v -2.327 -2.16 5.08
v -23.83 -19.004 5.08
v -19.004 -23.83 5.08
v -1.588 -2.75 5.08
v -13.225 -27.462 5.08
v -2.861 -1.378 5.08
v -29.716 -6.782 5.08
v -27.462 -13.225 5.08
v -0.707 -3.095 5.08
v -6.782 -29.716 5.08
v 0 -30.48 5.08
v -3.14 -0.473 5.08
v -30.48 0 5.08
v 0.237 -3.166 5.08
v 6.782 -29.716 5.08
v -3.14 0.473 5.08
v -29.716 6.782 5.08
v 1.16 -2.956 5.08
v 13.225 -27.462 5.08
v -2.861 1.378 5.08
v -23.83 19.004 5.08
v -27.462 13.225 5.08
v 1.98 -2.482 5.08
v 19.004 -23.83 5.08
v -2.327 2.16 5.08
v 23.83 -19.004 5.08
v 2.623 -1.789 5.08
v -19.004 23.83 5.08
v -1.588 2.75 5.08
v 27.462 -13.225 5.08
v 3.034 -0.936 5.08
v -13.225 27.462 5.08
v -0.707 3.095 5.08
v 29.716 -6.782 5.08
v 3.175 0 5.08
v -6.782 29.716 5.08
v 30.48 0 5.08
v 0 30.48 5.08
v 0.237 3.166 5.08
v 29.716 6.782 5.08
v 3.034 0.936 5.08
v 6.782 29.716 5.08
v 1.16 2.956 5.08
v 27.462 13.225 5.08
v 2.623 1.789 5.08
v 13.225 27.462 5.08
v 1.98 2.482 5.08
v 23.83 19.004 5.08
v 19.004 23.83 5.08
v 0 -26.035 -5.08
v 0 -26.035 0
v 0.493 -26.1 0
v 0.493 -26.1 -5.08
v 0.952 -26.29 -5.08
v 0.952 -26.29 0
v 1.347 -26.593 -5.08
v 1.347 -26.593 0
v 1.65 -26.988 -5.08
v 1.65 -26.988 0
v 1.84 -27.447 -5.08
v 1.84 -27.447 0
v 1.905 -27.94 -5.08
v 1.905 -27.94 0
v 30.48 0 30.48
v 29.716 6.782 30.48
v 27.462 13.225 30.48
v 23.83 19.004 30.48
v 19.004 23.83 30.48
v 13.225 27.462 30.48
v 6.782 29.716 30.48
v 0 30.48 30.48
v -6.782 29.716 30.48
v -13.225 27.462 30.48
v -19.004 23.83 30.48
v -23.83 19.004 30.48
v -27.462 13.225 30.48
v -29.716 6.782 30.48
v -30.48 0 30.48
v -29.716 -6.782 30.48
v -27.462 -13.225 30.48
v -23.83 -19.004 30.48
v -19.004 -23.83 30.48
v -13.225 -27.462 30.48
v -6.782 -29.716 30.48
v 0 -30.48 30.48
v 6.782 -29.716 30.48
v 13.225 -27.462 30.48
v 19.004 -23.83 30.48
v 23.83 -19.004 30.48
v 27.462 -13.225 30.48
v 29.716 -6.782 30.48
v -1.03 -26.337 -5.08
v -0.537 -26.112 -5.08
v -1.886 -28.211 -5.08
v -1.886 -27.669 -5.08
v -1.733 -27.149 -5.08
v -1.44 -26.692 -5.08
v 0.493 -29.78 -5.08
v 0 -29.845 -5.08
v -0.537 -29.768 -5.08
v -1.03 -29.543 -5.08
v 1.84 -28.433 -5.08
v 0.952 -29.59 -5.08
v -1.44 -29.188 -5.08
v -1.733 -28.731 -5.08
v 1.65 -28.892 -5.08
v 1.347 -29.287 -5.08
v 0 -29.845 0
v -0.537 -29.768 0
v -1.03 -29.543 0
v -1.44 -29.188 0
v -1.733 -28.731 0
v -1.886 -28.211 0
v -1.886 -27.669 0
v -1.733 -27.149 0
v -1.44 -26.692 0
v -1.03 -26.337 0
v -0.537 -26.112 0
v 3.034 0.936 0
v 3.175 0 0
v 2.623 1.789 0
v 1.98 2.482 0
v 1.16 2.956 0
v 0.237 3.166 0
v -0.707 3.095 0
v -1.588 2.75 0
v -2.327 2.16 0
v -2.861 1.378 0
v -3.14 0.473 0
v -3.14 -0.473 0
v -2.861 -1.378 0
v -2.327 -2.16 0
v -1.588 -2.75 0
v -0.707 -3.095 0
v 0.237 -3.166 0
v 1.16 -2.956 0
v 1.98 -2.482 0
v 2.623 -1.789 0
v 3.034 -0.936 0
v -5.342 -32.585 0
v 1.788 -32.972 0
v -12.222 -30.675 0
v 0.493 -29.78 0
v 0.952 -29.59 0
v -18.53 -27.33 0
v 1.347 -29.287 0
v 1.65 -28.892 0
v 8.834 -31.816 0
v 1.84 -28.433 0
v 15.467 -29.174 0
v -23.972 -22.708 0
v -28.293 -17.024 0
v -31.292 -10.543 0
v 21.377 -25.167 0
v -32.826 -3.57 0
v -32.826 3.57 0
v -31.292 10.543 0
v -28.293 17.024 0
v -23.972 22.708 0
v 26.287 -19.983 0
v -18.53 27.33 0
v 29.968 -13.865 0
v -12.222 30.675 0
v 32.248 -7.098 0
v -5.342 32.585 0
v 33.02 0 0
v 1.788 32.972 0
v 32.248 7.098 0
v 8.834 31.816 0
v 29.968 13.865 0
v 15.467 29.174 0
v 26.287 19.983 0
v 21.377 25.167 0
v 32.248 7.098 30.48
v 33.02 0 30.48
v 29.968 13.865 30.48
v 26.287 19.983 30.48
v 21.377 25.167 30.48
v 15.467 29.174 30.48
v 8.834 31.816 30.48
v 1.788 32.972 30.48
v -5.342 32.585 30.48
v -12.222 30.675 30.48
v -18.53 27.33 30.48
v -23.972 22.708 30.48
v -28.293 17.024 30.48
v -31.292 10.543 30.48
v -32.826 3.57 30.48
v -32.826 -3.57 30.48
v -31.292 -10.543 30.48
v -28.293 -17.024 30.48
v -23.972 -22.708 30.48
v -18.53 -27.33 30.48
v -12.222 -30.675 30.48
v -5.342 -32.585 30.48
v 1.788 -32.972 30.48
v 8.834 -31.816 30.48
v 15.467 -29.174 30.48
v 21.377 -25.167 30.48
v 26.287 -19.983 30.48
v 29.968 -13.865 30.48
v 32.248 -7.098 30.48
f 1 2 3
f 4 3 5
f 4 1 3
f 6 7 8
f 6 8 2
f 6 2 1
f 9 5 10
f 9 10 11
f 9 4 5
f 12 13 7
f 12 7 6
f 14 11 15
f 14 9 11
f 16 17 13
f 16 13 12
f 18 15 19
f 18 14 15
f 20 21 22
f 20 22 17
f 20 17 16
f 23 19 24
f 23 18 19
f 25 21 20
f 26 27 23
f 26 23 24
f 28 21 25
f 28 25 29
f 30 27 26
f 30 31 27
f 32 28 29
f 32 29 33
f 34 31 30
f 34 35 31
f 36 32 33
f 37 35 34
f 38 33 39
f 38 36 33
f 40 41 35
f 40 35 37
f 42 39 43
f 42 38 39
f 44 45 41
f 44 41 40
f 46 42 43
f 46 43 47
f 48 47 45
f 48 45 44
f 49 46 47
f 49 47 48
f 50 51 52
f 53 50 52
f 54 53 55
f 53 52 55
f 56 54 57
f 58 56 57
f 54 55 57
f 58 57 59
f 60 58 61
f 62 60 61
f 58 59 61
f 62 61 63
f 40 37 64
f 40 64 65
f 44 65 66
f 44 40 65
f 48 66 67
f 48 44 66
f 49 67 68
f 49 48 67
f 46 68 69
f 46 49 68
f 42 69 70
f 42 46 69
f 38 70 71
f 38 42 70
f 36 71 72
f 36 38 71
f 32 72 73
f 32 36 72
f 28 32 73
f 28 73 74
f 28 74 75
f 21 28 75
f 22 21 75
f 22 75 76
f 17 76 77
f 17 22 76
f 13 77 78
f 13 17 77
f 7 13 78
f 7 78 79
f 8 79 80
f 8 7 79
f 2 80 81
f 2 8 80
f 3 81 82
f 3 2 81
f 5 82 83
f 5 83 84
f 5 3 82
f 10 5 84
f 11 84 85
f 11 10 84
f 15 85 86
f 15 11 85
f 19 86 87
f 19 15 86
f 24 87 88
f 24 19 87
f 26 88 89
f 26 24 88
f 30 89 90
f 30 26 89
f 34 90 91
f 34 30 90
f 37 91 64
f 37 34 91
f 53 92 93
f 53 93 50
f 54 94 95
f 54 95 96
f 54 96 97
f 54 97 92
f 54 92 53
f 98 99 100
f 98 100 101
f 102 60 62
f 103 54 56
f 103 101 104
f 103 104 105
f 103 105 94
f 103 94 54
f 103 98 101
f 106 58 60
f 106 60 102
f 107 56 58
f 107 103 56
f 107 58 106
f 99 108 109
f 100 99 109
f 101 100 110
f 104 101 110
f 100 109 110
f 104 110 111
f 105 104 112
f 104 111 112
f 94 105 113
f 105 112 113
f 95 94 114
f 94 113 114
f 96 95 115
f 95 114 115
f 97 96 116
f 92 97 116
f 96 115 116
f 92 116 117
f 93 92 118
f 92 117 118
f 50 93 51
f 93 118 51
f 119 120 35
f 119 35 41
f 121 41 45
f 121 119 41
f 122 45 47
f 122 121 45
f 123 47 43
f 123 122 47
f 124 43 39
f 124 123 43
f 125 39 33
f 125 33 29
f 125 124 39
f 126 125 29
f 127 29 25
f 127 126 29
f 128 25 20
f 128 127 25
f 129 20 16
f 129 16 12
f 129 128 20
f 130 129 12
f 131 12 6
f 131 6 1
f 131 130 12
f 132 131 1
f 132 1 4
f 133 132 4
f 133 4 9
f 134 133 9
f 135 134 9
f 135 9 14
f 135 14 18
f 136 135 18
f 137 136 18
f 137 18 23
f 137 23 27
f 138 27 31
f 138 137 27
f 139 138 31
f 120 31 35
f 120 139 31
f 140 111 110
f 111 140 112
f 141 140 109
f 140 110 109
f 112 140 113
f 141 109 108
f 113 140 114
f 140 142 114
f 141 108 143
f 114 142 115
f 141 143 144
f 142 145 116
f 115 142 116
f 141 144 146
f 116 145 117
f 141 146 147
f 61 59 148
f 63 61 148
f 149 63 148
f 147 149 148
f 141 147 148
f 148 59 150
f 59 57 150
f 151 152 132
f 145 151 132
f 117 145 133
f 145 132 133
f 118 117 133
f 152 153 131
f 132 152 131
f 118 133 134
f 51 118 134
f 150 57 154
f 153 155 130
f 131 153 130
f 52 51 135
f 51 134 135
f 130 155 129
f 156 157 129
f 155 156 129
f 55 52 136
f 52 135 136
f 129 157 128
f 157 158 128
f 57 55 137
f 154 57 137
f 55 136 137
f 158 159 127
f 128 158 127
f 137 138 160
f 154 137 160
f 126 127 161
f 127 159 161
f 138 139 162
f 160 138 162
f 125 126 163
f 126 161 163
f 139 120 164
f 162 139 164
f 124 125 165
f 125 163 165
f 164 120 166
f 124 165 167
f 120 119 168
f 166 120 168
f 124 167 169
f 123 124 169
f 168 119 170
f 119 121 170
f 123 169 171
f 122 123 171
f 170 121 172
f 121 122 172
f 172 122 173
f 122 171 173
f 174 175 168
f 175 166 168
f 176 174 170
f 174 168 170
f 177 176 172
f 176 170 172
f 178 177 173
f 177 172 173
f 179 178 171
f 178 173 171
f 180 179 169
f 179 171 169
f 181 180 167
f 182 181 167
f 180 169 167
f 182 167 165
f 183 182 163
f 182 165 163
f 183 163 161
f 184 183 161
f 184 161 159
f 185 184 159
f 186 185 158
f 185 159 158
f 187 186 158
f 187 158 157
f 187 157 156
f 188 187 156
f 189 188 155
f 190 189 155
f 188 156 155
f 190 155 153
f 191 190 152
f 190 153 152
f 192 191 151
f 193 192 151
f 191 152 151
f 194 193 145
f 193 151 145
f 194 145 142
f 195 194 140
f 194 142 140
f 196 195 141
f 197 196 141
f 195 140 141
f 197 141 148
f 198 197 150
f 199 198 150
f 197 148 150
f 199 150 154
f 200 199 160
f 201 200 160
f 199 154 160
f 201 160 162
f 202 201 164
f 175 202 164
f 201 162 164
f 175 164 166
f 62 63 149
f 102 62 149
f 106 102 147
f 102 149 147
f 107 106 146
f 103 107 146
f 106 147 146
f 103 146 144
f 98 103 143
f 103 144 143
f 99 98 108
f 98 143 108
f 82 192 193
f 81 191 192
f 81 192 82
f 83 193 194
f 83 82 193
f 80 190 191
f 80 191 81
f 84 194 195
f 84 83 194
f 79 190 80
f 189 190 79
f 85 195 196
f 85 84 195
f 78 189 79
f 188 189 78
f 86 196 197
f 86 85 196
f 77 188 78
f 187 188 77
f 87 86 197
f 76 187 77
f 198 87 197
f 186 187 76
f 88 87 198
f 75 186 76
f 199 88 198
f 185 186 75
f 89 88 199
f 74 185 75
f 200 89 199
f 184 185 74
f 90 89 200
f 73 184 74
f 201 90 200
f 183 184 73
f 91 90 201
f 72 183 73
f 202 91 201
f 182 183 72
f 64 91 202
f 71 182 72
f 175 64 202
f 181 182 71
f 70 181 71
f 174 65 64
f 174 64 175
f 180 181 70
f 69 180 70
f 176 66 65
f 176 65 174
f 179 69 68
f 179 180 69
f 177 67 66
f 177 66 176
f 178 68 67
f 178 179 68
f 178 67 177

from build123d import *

# Parameters (mm, degrees)
F0_R     = 33.02
F0_R_2   = 3.175
F1_DEPTH = 5.08
F2_R     = 33.02
F2_R_2   = 30.48
F3_DEPTH = 25.4
F5_DEPTH = 5.08


with BuildPart() as f1:
    # F0 (on Top) → F1 (new body)
    with BuildSketch(Plane.XY):
        Circle(F0_R)
        Circle(F0_R_2, mode=Mode.SUBTRACT)
    extrude(amount=F1_DEPTH)

    # F2 (on face) → F3 (join)
    with BuildSketch(Plane.XY.offset(5.08)):
        Circle(F2_R)
        Circle(F2_R_2, mode=Mode.SUBTRACT)
    extrude(amount=F3_DEPTH)

    # F4 (on face) → F5 (join)
    with BuildSketch(Plane(origin=(0, 0, 0), x_dir=(1, 0, 0), z_dir=(0, 0, -1))):
        with BuildLine():
            Line((0, 29.845), (0, 26.035))
            ThreePointArc((0, 26.035), (1.347038, 26.592962), (1.905, 27.94))
            ThreePointArc((1.905, 27.94), (1.347038, 29.287038), (0, 29.845))
        make_face()
        with BuildLine():
            ThreePointArc((0, 29.845), (-1.905, 27.94), (0, 26.035))
            Line((0, 26.035), (0, 29.845))
        make_face()
    extrude(amount=F5_DEPTH)


solid = f1.part
